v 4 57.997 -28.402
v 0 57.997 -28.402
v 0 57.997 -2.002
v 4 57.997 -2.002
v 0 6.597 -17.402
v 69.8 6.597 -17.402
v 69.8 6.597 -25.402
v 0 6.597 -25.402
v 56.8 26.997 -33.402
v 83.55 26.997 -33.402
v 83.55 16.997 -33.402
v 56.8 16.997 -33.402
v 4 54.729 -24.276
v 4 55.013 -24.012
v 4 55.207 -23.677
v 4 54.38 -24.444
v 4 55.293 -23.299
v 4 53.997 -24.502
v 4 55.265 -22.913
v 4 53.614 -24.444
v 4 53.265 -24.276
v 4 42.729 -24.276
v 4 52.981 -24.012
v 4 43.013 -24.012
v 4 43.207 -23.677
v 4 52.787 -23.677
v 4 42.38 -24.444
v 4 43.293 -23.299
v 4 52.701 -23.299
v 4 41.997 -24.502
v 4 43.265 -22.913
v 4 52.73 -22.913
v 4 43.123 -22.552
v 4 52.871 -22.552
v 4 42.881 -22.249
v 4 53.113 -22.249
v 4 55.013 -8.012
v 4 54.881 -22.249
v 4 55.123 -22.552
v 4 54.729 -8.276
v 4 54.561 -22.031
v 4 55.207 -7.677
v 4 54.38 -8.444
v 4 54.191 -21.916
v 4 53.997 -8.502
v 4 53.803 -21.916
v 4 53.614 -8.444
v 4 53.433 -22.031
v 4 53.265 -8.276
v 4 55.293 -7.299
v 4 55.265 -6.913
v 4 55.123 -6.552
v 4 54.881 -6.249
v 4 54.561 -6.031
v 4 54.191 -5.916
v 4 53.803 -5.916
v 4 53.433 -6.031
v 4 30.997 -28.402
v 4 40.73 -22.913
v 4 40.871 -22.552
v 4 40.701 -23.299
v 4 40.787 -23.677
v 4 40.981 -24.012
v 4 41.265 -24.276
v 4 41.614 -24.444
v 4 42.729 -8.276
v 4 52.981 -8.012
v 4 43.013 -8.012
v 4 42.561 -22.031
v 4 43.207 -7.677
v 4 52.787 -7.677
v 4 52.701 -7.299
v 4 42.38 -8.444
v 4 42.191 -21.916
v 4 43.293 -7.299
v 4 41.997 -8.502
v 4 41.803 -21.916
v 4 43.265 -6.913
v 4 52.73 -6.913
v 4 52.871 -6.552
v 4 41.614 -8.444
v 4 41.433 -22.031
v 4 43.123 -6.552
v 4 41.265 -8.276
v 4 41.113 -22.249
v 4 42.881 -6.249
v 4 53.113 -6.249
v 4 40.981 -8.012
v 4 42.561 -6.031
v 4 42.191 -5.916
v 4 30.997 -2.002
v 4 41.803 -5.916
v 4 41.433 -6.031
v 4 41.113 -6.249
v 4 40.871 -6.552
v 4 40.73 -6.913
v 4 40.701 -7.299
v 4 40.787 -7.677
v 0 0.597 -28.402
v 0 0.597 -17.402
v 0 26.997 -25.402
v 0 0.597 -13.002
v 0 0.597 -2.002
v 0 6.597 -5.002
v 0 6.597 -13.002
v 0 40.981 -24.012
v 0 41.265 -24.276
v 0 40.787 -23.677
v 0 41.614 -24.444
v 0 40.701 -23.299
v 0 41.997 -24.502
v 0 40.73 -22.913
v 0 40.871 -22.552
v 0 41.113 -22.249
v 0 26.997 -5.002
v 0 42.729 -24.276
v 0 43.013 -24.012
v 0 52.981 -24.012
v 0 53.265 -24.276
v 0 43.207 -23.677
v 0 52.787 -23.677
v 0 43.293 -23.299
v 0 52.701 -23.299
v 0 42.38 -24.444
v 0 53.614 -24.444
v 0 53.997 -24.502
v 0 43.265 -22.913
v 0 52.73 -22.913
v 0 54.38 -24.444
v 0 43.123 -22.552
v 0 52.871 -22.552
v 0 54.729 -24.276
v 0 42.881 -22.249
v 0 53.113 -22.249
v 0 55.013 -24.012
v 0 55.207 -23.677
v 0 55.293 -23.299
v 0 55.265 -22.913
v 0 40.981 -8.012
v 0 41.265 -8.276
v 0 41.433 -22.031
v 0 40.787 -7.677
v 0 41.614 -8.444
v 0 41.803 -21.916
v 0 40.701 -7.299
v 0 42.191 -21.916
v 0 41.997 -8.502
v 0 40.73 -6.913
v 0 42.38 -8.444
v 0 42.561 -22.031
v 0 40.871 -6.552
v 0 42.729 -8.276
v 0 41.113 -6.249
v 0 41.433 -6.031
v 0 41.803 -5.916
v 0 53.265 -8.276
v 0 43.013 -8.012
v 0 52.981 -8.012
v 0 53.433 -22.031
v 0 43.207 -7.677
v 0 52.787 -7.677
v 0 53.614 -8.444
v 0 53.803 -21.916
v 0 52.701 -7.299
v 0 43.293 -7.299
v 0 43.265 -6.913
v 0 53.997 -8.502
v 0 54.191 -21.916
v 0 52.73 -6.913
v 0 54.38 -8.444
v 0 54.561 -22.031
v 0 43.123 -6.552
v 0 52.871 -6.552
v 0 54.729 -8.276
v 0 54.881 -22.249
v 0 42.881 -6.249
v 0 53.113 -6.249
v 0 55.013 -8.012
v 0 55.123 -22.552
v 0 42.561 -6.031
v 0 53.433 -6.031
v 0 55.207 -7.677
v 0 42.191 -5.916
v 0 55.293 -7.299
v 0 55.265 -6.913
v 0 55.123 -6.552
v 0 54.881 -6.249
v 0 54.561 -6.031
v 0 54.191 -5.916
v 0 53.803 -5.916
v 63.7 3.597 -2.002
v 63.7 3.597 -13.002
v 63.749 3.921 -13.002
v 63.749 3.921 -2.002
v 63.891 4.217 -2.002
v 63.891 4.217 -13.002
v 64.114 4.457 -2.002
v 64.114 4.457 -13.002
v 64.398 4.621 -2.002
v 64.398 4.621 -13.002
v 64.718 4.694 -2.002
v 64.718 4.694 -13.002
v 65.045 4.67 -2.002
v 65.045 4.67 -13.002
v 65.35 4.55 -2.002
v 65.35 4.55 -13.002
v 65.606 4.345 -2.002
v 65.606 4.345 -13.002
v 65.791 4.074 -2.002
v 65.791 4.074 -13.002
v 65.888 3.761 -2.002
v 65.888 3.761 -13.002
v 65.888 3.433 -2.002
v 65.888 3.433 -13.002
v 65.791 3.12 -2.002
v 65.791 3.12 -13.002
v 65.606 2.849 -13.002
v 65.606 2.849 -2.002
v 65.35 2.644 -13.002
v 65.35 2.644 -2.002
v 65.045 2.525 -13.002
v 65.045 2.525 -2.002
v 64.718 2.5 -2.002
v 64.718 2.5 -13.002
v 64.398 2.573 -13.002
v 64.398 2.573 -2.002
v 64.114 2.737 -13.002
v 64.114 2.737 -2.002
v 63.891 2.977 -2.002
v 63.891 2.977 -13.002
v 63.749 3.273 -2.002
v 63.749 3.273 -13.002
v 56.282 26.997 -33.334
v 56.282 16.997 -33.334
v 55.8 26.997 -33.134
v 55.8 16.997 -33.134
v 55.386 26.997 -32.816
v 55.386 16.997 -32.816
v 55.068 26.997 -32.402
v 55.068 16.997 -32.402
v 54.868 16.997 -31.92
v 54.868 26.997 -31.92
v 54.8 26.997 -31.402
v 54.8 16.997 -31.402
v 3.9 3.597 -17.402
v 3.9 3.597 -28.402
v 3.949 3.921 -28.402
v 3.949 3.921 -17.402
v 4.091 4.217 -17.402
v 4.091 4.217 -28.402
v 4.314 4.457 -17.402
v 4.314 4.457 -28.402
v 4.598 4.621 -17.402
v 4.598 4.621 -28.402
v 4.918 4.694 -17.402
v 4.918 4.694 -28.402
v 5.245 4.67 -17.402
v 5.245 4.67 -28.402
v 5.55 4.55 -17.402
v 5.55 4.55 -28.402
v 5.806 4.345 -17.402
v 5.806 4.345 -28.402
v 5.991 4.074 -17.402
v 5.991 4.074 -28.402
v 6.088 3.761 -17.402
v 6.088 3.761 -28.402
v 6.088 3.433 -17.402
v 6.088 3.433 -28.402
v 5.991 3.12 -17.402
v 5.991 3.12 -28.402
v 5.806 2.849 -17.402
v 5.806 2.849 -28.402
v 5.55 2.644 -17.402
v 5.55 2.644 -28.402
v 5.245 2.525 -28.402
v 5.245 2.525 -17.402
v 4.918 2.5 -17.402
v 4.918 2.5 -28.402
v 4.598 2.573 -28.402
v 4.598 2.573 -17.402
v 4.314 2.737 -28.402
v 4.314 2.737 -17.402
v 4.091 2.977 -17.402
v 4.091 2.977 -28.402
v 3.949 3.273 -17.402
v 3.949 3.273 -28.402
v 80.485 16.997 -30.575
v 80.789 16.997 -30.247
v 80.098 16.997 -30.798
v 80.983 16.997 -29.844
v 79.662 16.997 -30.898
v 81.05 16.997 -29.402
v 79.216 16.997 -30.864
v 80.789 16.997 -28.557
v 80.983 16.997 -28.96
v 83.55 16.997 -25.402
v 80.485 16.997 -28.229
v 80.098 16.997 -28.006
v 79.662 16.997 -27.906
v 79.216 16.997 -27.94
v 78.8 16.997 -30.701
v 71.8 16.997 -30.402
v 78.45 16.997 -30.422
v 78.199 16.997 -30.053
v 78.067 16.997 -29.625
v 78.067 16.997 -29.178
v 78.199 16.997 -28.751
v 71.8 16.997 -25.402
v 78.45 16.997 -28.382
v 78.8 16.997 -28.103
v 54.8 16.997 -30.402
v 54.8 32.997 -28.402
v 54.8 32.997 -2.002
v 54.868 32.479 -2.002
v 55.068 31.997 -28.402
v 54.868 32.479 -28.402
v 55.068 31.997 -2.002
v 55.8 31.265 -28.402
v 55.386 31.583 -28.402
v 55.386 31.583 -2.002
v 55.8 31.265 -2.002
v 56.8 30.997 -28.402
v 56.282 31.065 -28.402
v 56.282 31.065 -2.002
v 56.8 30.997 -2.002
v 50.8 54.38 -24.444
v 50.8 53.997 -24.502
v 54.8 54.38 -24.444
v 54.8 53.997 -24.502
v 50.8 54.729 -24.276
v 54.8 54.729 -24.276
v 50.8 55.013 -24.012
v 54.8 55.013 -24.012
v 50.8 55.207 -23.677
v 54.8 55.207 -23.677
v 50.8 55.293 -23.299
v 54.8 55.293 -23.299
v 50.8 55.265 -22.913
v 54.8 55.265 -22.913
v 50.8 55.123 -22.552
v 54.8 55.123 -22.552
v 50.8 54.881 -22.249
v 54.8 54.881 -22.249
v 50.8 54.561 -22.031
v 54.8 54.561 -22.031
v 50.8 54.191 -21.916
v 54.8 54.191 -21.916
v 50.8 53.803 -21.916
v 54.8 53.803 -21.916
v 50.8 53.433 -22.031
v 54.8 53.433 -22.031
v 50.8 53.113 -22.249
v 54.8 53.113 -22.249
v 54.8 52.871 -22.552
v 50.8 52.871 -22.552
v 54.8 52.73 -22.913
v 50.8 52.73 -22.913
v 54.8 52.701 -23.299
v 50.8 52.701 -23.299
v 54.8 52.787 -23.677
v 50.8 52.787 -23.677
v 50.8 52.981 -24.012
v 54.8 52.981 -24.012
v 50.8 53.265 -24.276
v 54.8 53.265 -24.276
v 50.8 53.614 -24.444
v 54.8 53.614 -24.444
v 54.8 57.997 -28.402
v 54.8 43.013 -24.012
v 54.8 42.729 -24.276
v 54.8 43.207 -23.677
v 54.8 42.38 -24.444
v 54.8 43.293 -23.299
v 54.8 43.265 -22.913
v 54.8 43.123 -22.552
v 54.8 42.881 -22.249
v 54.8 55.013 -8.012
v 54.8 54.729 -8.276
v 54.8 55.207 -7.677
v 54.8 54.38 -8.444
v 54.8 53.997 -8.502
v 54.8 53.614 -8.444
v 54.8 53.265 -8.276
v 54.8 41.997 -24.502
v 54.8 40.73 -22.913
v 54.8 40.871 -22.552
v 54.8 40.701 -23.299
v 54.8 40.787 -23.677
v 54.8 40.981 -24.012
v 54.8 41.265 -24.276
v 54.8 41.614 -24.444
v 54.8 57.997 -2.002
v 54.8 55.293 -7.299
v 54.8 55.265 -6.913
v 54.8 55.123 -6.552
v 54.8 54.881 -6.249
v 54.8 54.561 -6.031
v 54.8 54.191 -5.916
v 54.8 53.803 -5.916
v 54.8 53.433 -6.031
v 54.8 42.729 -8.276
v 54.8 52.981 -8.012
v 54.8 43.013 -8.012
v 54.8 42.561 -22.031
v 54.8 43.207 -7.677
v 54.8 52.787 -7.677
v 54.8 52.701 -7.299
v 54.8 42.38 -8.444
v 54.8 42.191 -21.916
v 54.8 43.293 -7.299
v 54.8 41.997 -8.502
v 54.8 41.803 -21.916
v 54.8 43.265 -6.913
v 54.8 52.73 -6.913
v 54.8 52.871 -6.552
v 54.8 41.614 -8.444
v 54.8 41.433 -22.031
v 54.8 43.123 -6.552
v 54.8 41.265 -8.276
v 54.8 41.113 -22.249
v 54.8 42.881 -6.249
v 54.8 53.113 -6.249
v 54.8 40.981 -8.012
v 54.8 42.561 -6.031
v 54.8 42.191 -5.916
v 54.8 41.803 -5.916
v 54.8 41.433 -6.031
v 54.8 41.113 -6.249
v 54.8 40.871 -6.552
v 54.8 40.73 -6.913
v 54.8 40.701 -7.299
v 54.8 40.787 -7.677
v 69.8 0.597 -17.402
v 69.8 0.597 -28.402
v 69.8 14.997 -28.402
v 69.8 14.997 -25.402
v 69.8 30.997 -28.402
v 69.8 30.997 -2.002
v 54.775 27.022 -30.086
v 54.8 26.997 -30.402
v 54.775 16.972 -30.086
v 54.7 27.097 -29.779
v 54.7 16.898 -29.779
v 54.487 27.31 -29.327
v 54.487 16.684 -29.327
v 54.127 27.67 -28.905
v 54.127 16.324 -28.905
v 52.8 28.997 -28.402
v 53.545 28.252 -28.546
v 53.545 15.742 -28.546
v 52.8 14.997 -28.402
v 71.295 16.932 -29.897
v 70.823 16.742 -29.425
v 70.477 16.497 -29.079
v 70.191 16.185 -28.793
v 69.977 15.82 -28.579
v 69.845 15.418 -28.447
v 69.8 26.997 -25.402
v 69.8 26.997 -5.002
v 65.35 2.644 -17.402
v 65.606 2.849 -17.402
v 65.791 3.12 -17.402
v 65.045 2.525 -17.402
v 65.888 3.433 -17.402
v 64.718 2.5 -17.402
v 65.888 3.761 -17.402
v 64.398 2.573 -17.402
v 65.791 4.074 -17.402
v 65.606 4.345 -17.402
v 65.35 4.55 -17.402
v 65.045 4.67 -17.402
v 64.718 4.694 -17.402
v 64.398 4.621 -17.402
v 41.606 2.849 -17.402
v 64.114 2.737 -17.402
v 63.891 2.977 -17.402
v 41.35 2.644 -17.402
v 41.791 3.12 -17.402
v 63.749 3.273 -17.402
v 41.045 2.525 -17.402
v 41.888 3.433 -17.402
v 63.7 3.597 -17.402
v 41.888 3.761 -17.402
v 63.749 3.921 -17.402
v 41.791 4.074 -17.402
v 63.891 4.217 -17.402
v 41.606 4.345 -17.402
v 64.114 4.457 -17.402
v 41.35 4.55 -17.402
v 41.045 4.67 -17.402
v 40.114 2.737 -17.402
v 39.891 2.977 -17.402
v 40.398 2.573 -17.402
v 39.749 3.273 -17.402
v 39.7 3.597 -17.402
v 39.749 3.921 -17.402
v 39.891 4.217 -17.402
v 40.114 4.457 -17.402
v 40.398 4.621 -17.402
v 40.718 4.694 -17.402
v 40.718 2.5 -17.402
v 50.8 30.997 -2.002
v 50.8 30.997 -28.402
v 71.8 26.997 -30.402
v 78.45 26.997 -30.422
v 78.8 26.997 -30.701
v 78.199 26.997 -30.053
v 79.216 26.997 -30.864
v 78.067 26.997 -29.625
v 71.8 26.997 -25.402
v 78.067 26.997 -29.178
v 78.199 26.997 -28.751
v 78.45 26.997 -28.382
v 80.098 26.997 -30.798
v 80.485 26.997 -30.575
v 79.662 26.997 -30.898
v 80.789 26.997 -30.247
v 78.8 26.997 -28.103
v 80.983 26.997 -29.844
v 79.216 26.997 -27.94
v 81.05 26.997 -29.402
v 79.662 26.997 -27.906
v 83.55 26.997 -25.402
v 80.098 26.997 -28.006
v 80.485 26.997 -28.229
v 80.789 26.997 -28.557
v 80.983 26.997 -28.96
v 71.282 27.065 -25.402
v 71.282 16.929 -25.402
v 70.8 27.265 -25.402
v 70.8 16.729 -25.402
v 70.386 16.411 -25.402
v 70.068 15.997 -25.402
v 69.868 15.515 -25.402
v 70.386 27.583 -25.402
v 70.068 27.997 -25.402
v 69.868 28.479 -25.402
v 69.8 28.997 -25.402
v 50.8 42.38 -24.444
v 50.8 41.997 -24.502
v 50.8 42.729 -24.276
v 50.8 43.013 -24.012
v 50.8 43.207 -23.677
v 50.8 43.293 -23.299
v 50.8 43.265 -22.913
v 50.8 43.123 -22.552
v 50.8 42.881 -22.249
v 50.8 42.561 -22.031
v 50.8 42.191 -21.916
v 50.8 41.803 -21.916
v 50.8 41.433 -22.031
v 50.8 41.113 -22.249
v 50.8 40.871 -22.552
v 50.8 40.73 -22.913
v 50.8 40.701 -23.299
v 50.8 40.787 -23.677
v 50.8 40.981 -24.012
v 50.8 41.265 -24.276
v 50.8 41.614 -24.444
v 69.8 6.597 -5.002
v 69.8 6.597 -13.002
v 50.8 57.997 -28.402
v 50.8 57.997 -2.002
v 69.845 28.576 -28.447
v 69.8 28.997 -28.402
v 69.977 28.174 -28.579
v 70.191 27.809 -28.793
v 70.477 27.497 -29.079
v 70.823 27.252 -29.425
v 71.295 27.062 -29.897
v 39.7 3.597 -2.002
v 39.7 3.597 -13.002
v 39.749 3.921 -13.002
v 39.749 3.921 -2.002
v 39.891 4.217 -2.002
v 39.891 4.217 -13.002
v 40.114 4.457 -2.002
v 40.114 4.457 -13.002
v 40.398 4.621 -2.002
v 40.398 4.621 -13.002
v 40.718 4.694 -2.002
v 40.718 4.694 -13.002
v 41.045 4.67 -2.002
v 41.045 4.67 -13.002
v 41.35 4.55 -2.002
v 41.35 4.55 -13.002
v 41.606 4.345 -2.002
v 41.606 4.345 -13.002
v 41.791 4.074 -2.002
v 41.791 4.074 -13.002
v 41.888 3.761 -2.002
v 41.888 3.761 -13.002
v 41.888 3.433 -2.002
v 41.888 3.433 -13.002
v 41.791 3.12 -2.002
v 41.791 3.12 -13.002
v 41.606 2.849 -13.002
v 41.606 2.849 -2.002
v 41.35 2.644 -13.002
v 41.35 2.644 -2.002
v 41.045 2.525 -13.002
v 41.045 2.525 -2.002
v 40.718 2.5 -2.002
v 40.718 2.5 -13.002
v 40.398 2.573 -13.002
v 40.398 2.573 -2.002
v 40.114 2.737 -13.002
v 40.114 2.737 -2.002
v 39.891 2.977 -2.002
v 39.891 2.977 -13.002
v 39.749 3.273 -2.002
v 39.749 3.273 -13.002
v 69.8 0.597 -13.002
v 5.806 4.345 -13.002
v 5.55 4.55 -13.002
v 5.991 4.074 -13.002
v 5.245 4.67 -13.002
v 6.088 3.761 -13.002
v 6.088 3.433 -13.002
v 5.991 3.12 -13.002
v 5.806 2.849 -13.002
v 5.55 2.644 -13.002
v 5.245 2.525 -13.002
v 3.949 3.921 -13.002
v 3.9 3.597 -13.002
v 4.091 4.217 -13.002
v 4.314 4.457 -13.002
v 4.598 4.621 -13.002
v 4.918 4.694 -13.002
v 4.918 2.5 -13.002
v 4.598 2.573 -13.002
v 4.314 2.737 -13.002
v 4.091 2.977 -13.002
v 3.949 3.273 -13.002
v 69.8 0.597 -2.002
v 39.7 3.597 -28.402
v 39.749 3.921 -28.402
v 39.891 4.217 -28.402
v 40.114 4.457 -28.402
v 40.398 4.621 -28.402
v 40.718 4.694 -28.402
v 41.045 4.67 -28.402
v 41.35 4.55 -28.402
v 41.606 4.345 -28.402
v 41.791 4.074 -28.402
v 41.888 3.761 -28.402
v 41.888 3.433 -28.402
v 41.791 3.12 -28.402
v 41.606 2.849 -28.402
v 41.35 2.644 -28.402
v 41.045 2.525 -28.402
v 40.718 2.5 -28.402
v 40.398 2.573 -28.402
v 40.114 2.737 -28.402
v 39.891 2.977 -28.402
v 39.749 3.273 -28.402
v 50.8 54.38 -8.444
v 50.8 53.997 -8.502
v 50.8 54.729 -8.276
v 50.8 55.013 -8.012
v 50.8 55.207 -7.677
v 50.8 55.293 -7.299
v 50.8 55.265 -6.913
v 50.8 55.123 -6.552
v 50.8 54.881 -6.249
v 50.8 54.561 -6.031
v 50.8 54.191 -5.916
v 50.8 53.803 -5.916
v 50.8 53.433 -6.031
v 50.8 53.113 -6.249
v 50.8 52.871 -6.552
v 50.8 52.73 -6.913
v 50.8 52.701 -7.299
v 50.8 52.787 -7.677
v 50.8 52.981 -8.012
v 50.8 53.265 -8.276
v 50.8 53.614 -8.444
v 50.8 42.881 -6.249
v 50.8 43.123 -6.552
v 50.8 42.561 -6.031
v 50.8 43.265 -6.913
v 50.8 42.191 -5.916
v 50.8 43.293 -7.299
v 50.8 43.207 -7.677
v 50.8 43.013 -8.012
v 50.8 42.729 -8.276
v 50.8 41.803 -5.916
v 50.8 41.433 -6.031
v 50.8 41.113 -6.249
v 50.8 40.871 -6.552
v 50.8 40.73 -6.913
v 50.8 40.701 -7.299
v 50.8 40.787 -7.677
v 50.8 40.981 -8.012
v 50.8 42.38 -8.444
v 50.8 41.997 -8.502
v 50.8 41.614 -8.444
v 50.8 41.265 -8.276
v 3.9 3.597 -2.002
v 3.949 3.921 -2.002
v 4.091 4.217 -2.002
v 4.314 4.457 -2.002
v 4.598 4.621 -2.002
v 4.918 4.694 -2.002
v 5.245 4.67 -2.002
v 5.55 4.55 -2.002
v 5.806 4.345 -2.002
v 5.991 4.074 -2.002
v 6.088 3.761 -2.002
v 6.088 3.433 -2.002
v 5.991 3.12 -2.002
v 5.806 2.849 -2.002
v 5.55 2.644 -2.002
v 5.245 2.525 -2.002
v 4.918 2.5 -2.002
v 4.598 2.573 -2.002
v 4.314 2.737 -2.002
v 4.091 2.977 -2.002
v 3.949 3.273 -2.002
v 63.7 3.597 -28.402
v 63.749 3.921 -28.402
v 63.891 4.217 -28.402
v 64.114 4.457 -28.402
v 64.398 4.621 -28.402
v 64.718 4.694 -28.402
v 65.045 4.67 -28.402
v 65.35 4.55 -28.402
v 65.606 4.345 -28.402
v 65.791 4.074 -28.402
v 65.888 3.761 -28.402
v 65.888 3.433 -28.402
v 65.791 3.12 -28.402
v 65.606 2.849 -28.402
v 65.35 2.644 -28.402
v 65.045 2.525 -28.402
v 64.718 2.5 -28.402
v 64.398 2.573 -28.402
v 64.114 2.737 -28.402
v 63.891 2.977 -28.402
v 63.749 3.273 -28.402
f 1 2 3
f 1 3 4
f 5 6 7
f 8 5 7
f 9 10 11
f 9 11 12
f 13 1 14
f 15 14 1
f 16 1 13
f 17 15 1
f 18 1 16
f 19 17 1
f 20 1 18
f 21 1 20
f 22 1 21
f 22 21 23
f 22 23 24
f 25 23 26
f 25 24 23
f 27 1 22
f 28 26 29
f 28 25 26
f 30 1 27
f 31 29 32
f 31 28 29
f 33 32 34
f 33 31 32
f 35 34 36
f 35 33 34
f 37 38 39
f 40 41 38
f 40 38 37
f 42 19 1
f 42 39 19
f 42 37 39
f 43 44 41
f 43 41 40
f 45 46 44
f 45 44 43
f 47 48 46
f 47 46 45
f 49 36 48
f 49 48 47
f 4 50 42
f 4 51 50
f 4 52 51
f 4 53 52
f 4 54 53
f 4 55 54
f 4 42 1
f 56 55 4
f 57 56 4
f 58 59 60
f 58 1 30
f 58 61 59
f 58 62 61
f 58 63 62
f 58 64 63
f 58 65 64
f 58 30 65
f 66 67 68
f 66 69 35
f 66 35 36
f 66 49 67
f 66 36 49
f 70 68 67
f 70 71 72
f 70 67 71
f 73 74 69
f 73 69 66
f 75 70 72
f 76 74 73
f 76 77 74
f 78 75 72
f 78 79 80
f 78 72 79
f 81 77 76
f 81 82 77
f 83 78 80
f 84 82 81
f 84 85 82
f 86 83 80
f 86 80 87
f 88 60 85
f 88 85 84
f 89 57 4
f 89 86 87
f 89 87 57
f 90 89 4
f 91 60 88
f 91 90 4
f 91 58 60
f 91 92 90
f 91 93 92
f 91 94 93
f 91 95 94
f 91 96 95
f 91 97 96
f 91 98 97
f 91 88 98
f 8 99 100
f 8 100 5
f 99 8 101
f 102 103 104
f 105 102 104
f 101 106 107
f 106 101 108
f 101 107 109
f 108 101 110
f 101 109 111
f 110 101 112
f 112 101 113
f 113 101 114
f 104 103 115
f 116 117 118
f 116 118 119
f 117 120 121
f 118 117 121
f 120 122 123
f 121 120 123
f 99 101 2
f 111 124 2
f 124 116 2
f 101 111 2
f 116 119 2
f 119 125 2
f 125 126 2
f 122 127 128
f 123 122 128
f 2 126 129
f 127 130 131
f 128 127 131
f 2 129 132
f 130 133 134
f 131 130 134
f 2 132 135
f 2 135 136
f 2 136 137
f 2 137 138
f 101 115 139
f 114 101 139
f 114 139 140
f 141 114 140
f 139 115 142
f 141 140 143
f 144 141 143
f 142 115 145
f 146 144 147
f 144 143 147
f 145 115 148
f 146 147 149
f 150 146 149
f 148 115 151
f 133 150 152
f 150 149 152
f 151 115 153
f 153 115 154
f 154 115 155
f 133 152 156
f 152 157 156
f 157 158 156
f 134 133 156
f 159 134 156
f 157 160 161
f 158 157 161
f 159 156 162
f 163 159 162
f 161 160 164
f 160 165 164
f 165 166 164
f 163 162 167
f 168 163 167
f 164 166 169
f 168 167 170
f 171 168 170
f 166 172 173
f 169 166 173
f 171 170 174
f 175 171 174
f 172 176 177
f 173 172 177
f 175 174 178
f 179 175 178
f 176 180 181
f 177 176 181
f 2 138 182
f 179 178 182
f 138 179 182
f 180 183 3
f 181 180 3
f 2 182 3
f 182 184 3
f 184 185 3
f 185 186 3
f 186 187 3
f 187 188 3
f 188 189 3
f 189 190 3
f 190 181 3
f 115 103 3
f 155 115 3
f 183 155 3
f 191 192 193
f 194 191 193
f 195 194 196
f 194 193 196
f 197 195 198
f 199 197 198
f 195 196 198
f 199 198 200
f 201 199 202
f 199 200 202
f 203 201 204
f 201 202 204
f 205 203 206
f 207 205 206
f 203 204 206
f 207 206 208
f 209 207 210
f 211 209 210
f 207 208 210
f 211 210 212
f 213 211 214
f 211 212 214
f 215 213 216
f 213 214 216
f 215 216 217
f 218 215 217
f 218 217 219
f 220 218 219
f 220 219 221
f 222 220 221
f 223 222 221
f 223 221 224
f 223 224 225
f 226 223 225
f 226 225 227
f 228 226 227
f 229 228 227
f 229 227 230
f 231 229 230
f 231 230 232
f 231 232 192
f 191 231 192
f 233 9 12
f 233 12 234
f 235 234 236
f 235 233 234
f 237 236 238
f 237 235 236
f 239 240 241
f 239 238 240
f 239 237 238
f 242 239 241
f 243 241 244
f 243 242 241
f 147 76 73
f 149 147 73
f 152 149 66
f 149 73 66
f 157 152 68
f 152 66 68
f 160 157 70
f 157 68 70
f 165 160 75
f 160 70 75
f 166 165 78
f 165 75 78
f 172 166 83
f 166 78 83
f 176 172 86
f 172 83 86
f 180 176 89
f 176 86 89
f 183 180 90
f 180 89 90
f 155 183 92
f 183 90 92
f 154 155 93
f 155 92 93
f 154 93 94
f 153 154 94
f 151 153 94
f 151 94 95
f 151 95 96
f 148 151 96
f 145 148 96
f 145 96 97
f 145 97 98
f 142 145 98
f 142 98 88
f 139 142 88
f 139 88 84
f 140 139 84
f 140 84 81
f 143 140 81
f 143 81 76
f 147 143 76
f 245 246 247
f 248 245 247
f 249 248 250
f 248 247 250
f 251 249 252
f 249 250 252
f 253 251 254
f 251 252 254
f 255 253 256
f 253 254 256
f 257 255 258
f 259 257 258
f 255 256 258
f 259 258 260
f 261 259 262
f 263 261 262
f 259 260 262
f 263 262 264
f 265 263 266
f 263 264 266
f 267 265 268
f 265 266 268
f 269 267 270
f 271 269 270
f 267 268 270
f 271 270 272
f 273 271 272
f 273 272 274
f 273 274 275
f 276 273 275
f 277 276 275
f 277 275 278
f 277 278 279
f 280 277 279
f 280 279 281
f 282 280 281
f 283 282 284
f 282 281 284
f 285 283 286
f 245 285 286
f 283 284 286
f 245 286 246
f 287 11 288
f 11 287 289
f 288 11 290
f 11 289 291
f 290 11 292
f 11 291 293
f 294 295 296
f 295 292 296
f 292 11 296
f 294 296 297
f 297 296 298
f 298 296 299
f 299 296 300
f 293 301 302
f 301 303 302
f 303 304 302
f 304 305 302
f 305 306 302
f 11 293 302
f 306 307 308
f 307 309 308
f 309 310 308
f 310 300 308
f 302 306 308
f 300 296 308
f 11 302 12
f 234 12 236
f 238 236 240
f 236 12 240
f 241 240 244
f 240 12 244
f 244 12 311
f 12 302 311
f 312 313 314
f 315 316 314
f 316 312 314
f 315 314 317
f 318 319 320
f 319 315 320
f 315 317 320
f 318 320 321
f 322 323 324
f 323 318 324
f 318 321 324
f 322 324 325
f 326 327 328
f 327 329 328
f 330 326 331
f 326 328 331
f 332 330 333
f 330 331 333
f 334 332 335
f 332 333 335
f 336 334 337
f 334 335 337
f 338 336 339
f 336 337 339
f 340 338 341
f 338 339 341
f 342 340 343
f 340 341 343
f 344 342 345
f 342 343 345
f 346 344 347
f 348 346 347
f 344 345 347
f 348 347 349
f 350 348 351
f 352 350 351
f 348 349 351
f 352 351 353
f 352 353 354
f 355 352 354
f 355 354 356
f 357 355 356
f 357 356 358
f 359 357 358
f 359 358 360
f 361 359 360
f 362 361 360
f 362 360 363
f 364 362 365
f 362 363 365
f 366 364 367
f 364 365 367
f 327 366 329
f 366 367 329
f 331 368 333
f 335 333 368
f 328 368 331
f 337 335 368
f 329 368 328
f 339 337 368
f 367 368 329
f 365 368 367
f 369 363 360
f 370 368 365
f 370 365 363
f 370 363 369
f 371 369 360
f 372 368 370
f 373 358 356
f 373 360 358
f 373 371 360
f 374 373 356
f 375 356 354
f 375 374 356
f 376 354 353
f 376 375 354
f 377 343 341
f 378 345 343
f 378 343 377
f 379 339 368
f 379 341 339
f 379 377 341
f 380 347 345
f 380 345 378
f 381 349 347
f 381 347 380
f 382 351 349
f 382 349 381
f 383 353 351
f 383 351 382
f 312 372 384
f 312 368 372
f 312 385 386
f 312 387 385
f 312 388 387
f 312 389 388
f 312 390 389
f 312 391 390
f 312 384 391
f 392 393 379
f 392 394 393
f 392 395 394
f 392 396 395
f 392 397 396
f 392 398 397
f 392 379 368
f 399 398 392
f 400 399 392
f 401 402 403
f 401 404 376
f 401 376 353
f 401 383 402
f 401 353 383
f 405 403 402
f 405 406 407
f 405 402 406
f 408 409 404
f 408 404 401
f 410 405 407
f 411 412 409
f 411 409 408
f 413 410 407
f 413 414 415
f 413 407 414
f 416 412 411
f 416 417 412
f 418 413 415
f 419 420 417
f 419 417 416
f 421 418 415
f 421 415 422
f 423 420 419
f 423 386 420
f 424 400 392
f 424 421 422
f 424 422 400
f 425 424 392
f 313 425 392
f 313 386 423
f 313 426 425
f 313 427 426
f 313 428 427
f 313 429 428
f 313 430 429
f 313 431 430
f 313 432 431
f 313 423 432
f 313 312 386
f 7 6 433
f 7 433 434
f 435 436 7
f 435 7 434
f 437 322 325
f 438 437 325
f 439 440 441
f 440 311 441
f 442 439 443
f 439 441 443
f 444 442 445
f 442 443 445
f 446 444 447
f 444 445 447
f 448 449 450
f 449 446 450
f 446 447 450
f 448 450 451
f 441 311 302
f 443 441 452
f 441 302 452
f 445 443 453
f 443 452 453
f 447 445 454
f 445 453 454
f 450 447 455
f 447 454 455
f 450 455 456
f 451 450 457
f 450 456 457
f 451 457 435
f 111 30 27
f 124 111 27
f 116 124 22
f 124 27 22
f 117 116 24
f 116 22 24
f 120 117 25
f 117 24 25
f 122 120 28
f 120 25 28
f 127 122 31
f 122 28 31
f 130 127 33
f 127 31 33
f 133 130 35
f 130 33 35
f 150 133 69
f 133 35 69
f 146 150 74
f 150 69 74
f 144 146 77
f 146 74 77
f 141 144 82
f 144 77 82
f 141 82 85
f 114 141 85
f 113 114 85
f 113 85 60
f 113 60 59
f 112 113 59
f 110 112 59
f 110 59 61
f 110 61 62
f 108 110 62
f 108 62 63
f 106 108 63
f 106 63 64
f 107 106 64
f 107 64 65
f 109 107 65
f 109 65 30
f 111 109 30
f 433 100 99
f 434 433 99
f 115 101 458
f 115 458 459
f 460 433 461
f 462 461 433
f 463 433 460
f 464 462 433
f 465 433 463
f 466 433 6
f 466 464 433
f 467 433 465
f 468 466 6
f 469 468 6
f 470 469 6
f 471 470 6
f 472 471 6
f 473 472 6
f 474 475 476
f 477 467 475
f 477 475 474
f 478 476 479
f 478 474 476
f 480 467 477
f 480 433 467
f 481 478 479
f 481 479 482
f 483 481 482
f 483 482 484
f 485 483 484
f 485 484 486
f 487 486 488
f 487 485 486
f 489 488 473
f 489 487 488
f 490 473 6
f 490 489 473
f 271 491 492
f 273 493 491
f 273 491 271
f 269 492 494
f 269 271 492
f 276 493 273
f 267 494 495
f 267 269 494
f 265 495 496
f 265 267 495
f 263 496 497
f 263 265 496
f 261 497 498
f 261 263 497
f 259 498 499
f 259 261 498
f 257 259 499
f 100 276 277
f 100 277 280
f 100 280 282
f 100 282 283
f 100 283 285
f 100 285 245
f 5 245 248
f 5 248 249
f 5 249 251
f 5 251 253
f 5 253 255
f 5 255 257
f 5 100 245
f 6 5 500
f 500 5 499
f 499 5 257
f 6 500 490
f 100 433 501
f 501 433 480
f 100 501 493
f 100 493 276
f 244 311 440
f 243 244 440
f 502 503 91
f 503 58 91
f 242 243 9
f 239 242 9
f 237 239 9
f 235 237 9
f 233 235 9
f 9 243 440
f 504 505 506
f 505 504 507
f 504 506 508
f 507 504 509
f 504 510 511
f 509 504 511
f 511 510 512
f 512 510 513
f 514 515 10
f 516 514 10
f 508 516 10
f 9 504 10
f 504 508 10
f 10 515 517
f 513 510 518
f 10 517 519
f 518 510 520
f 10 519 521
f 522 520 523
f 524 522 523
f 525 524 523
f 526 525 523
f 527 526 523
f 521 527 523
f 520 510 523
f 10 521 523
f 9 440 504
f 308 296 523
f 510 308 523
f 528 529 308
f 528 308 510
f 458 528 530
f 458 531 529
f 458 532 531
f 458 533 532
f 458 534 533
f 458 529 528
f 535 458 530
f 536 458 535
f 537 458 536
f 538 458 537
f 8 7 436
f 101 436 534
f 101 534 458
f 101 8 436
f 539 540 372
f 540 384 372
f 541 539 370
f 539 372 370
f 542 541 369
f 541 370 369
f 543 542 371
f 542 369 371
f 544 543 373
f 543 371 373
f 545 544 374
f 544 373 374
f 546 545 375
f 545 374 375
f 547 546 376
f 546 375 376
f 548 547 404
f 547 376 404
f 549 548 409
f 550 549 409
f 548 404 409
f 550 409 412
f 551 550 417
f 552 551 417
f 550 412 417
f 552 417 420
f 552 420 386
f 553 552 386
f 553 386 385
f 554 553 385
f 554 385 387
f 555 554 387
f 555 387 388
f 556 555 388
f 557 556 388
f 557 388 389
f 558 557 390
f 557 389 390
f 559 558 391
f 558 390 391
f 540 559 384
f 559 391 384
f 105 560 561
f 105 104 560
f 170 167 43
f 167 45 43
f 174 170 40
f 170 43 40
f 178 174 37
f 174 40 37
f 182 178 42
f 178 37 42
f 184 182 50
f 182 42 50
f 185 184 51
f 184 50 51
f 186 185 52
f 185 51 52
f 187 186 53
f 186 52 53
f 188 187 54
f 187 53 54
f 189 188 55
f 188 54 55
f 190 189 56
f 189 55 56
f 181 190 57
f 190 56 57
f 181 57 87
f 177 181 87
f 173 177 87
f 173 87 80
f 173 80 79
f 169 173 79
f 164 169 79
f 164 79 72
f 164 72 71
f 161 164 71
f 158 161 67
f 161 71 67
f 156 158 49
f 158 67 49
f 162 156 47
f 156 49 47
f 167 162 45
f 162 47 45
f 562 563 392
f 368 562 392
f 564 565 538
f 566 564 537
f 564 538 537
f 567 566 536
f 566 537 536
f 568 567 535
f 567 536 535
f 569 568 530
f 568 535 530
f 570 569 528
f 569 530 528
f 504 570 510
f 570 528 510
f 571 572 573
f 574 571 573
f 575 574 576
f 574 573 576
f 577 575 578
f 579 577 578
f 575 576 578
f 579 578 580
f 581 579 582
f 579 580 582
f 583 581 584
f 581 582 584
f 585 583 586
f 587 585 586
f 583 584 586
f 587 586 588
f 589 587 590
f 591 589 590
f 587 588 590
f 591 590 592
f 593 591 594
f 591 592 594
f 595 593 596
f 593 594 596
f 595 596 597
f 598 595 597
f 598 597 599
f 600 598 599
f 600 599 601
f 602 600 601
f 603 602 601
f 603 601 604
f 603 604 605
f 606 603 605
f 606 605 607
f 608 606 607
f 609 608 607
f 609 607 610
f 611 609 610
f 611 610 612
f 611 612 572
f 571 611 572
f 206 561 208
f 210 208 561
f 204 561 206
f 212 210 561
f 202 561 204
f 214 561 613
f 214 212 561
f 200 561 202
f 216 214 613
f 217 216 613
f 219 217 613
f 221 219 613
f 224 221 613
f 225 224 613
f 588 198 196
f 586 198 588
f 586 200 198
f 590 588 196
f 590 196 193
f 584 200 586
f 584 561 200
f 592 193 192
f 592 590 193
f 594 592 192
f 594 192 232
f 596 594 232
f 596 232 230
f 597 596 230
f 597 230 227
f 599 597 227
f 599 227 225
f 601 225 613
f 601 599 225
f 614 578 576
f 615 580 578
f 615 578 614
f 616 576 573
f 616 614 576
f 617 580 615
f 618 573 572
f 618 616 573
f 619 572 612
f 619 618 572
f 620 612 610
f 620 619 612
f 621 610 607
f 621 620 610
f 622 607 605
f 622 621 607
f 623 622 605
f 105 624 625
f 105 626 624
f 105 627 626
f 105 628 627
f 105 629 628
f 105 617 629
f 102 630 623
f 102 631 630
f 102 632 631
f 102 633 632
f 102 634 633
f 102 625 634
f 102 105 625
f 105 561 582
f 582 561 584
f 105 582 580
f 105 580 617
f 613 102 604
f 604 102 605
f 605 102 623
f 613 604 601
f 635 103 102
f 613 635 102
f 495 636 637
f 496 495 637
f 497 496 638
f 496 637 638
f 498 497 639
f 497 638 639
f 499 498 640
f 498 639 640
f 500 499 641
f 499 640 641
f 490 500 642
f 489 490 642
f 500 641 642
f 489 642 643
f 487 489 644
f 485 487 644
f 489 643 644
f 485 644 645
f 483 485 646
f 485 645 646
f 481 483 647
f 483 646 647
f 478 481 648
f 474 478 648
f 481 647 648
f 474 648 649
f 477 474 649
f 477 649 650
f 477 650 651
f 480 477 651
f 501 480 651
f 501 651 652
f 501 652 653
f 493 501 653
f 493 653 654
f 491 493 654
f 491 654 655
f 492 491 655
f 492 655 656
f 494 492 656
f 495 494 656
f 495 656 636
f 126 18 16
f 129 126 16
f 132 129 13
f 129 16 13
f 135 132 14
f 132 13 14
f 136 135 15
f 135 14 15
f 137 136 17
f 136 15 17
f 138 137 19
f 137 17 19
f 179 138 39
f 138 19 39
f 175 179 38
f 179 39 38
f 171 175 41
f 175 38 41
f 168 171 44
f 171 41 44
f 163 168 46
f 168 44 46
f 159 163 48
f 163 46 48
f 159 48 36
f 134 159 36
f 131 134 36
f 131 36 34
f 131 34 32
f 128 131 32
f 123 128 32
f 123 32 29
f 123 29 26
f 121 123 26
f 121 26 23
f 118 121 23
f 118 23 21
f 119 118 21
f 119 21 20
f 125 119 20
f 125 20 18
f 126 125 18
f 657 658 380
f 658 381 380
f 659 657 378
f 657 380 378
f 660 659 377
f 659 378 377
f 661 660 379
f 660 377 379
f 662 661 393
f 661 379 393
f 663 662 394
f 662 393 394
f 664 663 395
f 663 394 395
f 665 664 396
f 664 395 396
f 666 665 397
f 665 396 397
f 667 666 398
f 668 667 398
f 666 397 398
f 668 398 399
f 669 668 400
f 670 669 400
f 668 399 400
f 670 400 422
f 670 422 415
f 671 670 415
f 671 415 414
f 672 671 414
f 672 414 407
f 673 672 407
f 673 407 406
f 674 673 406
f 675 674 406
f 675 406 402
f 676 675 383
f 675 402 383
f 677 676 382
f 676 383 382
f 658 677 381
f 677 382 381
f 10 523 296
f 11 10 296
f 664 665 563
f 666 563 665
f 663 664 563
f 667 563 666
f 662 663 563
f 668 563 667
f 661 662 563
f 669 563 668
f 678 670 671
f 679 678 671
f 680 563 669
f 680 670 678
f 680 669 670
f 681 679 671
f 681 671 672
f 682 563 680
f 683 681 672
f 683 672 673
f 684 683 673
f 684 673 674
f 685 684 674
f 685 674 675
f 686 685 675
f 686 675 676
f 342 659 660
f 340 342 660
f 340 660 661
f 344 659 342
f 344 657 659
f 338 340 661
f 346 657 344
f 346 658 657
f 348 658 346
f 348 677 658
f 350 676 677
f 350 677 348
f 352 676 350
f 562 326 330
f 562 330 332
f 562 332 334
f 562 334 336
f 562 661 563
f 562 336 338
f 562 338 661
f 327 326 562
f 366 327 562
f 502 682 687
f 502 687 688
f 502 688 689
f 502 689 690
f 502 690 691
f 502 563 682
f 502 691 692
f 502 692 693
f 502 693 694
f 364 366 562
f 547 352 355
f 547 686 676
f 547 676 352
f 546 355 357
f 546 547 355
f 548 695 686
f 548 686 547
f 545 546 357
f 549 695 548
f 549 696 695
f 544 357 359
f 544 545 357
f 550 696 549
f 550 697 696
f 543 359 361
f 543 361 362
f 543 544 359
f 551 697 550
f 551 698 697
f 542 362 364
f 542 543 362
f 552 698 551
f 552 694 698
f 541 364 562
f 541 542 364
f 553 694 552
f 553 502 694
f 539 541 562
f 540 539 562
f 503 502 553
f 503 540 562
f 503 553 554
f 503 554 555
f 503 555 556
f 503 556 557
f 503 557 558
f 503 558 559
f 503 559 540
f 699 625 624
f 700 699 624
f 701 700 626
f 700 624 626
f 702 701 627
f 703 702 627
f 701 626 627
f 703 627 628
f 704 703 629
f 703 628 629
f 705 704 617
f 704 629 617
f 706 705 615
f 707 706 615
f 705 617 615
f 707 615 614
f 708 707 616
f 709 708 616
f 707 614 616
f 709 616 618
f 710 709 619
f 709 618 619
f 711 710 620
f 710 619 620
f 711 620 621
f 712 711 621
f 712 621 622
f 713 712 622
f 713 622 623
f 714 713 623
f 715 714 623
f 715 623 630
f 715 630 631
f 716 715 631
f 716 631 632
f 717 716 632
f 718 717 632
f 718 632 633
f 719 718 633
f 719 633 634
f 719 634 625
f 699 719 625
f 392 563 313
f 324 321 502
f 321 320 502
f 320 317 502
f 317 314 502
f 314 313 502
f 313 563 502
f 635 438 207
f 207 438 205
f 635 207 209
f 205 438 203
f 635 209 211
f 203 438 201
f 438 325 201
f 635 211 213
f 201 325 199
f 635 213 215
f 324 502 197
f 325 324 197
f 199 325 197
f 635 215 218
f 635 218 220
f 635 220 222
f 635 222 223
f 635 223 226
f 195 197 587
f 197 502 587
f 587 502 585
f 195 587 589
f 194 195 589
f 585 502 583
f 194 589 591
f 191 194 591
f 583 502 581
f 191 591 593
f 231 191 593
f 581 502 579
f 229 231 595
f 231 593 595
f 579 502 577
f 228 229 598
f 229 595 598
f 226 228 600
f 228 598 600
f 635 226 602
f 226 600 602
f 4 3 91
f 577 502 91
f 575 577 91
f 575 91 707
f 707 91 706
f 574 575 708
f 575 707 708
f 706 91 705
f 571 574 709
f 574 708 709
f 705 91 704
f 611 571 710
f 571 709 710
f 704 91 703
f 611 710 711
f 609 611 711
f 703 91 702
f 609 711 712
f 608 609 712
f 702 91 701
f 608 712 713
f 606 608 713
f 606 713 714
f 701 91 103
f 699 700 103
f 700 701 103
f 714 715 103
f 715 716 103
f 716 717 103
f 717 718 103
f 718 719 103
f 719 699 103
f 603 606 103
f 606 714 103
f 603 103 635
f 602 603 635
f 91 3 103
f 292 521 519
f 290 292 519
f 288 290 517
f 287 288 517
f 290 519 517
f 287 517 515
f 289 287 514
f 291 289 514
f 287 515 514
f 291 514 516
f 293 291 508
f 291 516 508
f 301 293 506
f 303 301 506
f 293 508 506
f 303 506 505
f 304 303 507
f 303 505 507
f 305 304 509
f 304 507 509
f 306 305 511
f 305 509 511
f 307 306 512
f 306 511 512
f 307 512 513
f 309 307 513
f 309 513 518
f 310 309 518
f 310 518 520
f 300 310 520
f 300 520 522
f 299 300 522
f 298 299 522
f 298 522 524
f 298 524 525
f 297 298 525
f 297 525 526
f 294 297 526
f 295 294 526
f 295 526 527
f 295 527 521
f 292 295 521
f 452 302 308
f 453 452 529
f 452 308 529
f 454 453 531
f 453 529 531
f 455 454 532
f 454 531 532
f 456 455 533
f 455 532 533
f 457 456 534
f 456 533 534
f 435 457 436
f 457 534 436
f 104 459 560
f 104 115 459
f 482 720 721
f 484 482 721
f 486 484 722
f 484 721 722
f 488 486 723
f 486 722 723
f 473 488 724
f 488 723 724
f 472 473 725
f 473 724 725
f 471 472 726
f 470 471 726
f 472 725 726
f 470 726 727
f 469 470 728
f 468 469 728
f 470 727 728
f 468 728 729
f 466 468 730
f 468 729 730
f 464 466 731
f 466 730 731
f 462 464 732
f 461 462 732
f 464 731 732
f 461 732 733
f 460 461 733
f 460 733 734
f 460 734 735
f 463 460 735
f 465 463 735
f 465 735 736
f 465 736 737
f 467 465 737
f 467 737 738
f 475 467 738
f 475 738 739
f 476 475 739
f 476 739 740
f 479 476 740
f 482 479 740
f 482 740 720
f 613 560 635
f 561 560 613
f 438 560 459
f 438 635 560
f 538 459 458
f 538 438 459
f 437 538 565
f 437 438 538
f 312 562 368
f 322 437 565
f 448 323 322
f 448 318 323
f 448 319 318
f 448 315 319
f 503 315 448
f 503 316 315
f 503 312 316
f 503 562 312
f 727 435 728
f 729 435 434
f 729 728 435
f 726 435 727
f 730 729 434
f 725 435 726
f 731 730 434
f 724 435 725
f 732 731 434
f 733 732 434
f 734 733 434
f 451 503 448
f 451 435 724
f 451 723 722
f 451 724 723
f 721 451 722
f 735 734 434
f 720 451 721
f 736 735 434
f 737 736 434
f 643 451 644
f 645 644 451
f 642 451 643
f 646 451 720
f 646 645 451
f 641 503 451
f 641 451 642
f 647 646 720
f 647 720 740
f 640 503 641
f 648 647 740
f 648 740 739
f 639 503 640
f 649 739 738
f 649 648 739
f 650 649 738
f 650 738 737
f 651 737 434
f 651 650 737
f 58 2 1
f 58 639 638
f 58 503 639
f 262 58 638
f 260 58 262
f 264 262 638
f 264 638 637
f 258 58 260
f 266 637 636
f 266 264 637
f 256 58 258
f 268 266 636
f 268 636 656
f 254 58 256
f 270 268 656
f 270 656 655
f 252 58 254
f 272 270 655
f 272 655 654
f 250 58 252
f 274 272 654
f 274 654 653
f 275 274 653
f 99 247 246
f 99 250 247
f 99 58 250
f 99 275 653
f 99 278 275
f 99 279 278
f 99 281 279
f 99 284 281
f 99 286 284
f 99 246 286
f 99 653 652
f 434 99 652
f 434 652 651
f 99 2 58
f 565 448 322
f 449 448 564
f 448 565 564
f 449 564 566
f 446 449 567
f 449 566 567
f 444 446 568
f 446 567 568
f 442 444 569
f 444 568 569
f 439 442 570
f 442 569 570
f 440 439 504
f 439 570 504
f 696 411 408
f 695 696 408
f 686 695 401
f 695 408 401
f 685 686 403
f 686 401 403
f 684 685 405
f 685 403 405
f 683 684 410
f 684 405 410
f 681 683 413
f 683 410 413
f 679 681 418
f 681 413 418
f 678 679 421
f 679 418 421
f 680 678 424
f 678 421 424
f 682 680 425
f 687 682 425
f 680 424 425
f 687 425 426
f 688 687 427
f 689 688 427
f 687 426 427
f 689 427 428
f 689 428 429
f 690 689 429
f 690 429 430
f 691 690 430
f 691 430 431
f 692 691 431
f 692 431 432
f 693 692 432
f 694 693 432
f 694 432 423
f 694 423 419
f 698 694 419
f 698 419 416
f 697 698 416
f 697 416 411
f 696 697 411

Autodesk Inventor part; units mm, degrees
ref_plane "YZ Plane" through (0, 0, 0) normal (1, 0, 0) x (0, 1, 0)
ref_plane "XZ Plane" through (0, 0, 0) normal (0, 1, 0) x (-1, 0, 0)
ref_plane "XY Plane" through (0, 0, 0) normal (0, 0, 1) x (1, 0, 0)
sketch "Sketch2" plane through (0, 0, 0) normal (1, 0, 0) x (0, 1, 0)
  line L0 (26.9971, -5.0019) -> (6.5971, -5.0019)
  line L1 (6.5971, -5.0019) -> (6.5971, -25.4019)
  line L2 (6.5971, -25.4019) -> (26.9971, -25.4019)
  line L3 (26.9971, -25.4019) -> (26.9971, -5.0019)
  line L4 (30.9971, -2.0019) -> (0.5971, -2.0019)
  line L5 (30.9971, -28.4019) -> (30.9971, -2.0019)
  line L6 (0.5971, -2.0019) -> (0.5971, -28.4019)
  line L7 (30.9971, -28.4019) -> (0.5971, -28.4019)
  line L8 (6.5971, -13.0019) -> (0.5971, -13.0019)
  line L9 (0.5971, -13.0019) -> (0.5971, -17.4019)
  line L10 (0.5971, -17.4019) -> (6.5971, -17.4019)
  line L11 (6.5971, -17.4019) -> (6.5971, -13.0019)
  point P0 (0, 0)
  point P1 (0.5971, -13.0019)
  dimension "d5" = 20.4
  dimension "d6" = 20.4
  dimension "d8" = 6
  dimension "d22" = 4
  dimension "d23" = 3
  dimension "d24" = 3
  dimension "d27" = 8
  dimension "d28" = 8
extrude "Extrusion1" add sketch "Sketch2" along normal blind 54.8 contours L0 L1 L8 L6 L4 L5 L7 L10 L2 L3
sketch "Sketch4" plane through (0, 0.5971, -28.4019) normal (0, 0, -1) x (-1, 0, 0)
  line L0 (0, 6) -> (0, 26.4) projected
  line L1 (0, 26.4) -> (-54.8, 26.4) projected
  line L2 (-54.8, 6) -> (-54.8, 26.4) projected
  line L3 (0, 6) -> (-54.8, 6) projected
  line L4 (0, 26.4) -> (-54.8, 26.4) projected
  line L5 (-54.8, 26.4) -> (-83.55, 26.4)
  line L6 (-83.55, 26.4) -> (-83.55, 16.4)
  line L7 (-83.55, 16.4) -> (-54.8, 16.4)
  line L8 (-54.8, 16.4) -> (-54.8, 26.4)
  line L9 (-43.55, 26.4) -> (-43.55, 16.4) construction
  point P0 (0, -0.5971)
  dimension "d29" = 10
  dimension "d30" = 11.25
  dimension "d31" = 40
  dimension "d32" = 0
extrude "Extrusion3" add sketch "Sketch4" along normal blind 5 and the other way blind 3 contours L2 L7 L6 L5
sketch "Sketch10" plane through (54.8, 26.9971, -33.4019) normal (0, 1, 0) x (1, 0, 0)
  line L0 (28.75, -8) -> (0, -8) projected
  line L1 (28.75, -8) -> (28.75, 0) projected
  line L2 (0, 0) -> (28.75, 0) projected
  line L3 (0, 0) -> (0, -5) projected
  circle A0 centre (24.75, -4) radius 1.5
  line L4 (0, -8) -> (0, -5) projected
  point P0 (-54.8, -33.4019)
  dimension "d55" = 3
  dimension "d56" = 4
  dimension "d57" = 4
extrude "Extrusion8" cut sketch "Sketch10" against normal blind 10 contours A0
sketch "Sketch11" plane through (54.8, 0, 0) normal (1, 0, 0) x (0, 0, -1)
  line L0 (25.4019, 26.9971) -> (28.4019, 26.9971) projected
  line L1 (28.4019, 26.9971) -> (28.4019, 30.9971) projected
  line L2 (28.4019, 30.9971) -> (2.0019, 30.9971) projected
  line L3 (2.0019, 30.9971) -> (2.0019, 0.5971) projected
  line L4 (2.0019, 0.5971) -> (13.0019, 0.5971) projected
  line L5 (13.0019, 0.5971) -> (13.0019, 6.5971) projected
  line L6 (13.0019, 6.5971) -> (5.0019, 6.5971) projected
  line L7 (5.0019, 6.5971) -> (5.0019, 26.9971) projected
  line L8 (5.0019, 26.9971) -> (25.4019, 26.9971) projected
  line L9 (28.4019, 16.9971) -> (25.4019, 16.9971) projected
  line L10 (25.4019, 16.9971) -> (25.4019, 6.5971) projected
  line L11 (25.4019, 6.5971) -> (17.4019, 6.5971) projected
  line L12 (17.4019, 6.5971) -> (17.4019, 0.5971) projected
  line L13 (17.4019, 0.5971) -> (28.4019, 0.5971) projected
  line L14 (28.4019, 0.5971) -> (28.4019, 16.9971) projected
  point P0 (0, 0)
extrude "Extrusion9" add sketch "Sketch11" along normal blind 15
fillet "Fillet3" radius 2 6 edges at (62.3, 26.9971, -28.4019) (54.8, 21.9971, -28.4019) (62.3, 16.9971, -28.4019) (69.8, 26.9971, -26.9019) (69.8, 16.9971, -26.9019) (54.8, 21.9971, -33.4019)
sketch "Sketch12" plane through (0, 0.5971, -28.4019) normal (0, 0, -1) x (-1, 0, 0)
  line L0 (0, 0) -> (0, 6) projected
  line L1 (0, 6) -> (-69.8, 6) projected
  line L2 (-69.8, 0) -> (-69.8, 6) projected
  line L3 (0, 0) -> (-69.8, 0) projected
  circle A0 centre (-64.8, 3) radius 1.1
  circle A1 centre (-40.8, 3) radius 1.1
  circle A2 centre (-5, 3) radius 1.1
  point P0 (0, -0.5971)
  dimension "d64" = 2.2
  dimension "d65" = 5
  dimension "d66" = 3
  dimension "d67" = 2.2
  dimension "d68" = 2.2
  dimension "d69" = 5
  dimension "d70" = 3
  dimension "d71" = 29
  dimension "d72" = 3
extrude "Extrusion10" cut sketch "Sketch12" against normal blind 100 contours A0 | A1 | A2
sketch "Sketch13" plane through (0, 30.9971, -2.0019) normal (0, 1, 0) x (1, 0, 0)
  line L0 (0, 0) -> (69.8, 0) projected
  line L1 (0, 26.4) -> (69.8, 26.4) projected
  line L2 (54.8, 0) -> (50.8, 0)
  line L3 (50.8, 0) -> (50.8, 26.4)
  line L4 (50.8, 26.4) -> (54.8, 26.4)
  line L5 (54.8, 26.4) -> (54.8, 0)
  line L6 (4, 0) -> (0, 0)
  line L7 (0, 0) -> (0, 26.4)
  line L8 (0, 26.4) -> (4, 26.4)
  line L9 (4, 26.4) -> (4, 0)
  line L10 (0, 26.4) -> (0, 0) projected
  point P0 (0, -2.0019)
  point P1 (4, 0)
  point P2 (50.8, 0)
  dimension "d75" = 4
  dimension "d76" = 4
  dimension "d77" = 46.8
extrude "Extrusion11" add sketch "Sketch13" along normal blind 27 contours L7 L1 L9 L0 | L3 L1 L5 L0
sketch "Sketch14" plane through (54.8, 30.9971, -2.0019) normal (1, 0, 0) x (0, 0, -1)
  circle A0 centre (5.2, 11) radius 1.3
  line L0 (26.4, 0) -> (0, 0) projected
  circle A1 centre (5.2, 23) radius 1.3
  line L1 (0, 0) -> (0, 27) projected
  circle A2 centre (21.2, 23) radius 1.3
  circle A3 centre (21.2, 11) radius 1.3
  line L2 (26.4, 0) -> (26.4, 27) projected
  point P0 (-2.0019, -30.9971)
  dimension "d80" = 2.6
  dimension "d81" = 11
  dimension "d82" = 2.6
  dimension "d83" = 23
  dimension "d86" = 2.6
  dimension "d87" = 2.6
  dimension "d88" = 11
  dimension "d89" = 23
  dimension "d95" = 16
  dimension "d96" = 16
  dimension "d97" = 5.2
  dimension "d98" = 5.2
extrude "Extrusion12" cut sketch "Sketch14" against normal blind 100
fillet "Fillet4" radius 2 1 edges at (54.8, 30.9971, -15.2019)
equation "\"d98\" = d97"
properties part number "Motor_mount"
